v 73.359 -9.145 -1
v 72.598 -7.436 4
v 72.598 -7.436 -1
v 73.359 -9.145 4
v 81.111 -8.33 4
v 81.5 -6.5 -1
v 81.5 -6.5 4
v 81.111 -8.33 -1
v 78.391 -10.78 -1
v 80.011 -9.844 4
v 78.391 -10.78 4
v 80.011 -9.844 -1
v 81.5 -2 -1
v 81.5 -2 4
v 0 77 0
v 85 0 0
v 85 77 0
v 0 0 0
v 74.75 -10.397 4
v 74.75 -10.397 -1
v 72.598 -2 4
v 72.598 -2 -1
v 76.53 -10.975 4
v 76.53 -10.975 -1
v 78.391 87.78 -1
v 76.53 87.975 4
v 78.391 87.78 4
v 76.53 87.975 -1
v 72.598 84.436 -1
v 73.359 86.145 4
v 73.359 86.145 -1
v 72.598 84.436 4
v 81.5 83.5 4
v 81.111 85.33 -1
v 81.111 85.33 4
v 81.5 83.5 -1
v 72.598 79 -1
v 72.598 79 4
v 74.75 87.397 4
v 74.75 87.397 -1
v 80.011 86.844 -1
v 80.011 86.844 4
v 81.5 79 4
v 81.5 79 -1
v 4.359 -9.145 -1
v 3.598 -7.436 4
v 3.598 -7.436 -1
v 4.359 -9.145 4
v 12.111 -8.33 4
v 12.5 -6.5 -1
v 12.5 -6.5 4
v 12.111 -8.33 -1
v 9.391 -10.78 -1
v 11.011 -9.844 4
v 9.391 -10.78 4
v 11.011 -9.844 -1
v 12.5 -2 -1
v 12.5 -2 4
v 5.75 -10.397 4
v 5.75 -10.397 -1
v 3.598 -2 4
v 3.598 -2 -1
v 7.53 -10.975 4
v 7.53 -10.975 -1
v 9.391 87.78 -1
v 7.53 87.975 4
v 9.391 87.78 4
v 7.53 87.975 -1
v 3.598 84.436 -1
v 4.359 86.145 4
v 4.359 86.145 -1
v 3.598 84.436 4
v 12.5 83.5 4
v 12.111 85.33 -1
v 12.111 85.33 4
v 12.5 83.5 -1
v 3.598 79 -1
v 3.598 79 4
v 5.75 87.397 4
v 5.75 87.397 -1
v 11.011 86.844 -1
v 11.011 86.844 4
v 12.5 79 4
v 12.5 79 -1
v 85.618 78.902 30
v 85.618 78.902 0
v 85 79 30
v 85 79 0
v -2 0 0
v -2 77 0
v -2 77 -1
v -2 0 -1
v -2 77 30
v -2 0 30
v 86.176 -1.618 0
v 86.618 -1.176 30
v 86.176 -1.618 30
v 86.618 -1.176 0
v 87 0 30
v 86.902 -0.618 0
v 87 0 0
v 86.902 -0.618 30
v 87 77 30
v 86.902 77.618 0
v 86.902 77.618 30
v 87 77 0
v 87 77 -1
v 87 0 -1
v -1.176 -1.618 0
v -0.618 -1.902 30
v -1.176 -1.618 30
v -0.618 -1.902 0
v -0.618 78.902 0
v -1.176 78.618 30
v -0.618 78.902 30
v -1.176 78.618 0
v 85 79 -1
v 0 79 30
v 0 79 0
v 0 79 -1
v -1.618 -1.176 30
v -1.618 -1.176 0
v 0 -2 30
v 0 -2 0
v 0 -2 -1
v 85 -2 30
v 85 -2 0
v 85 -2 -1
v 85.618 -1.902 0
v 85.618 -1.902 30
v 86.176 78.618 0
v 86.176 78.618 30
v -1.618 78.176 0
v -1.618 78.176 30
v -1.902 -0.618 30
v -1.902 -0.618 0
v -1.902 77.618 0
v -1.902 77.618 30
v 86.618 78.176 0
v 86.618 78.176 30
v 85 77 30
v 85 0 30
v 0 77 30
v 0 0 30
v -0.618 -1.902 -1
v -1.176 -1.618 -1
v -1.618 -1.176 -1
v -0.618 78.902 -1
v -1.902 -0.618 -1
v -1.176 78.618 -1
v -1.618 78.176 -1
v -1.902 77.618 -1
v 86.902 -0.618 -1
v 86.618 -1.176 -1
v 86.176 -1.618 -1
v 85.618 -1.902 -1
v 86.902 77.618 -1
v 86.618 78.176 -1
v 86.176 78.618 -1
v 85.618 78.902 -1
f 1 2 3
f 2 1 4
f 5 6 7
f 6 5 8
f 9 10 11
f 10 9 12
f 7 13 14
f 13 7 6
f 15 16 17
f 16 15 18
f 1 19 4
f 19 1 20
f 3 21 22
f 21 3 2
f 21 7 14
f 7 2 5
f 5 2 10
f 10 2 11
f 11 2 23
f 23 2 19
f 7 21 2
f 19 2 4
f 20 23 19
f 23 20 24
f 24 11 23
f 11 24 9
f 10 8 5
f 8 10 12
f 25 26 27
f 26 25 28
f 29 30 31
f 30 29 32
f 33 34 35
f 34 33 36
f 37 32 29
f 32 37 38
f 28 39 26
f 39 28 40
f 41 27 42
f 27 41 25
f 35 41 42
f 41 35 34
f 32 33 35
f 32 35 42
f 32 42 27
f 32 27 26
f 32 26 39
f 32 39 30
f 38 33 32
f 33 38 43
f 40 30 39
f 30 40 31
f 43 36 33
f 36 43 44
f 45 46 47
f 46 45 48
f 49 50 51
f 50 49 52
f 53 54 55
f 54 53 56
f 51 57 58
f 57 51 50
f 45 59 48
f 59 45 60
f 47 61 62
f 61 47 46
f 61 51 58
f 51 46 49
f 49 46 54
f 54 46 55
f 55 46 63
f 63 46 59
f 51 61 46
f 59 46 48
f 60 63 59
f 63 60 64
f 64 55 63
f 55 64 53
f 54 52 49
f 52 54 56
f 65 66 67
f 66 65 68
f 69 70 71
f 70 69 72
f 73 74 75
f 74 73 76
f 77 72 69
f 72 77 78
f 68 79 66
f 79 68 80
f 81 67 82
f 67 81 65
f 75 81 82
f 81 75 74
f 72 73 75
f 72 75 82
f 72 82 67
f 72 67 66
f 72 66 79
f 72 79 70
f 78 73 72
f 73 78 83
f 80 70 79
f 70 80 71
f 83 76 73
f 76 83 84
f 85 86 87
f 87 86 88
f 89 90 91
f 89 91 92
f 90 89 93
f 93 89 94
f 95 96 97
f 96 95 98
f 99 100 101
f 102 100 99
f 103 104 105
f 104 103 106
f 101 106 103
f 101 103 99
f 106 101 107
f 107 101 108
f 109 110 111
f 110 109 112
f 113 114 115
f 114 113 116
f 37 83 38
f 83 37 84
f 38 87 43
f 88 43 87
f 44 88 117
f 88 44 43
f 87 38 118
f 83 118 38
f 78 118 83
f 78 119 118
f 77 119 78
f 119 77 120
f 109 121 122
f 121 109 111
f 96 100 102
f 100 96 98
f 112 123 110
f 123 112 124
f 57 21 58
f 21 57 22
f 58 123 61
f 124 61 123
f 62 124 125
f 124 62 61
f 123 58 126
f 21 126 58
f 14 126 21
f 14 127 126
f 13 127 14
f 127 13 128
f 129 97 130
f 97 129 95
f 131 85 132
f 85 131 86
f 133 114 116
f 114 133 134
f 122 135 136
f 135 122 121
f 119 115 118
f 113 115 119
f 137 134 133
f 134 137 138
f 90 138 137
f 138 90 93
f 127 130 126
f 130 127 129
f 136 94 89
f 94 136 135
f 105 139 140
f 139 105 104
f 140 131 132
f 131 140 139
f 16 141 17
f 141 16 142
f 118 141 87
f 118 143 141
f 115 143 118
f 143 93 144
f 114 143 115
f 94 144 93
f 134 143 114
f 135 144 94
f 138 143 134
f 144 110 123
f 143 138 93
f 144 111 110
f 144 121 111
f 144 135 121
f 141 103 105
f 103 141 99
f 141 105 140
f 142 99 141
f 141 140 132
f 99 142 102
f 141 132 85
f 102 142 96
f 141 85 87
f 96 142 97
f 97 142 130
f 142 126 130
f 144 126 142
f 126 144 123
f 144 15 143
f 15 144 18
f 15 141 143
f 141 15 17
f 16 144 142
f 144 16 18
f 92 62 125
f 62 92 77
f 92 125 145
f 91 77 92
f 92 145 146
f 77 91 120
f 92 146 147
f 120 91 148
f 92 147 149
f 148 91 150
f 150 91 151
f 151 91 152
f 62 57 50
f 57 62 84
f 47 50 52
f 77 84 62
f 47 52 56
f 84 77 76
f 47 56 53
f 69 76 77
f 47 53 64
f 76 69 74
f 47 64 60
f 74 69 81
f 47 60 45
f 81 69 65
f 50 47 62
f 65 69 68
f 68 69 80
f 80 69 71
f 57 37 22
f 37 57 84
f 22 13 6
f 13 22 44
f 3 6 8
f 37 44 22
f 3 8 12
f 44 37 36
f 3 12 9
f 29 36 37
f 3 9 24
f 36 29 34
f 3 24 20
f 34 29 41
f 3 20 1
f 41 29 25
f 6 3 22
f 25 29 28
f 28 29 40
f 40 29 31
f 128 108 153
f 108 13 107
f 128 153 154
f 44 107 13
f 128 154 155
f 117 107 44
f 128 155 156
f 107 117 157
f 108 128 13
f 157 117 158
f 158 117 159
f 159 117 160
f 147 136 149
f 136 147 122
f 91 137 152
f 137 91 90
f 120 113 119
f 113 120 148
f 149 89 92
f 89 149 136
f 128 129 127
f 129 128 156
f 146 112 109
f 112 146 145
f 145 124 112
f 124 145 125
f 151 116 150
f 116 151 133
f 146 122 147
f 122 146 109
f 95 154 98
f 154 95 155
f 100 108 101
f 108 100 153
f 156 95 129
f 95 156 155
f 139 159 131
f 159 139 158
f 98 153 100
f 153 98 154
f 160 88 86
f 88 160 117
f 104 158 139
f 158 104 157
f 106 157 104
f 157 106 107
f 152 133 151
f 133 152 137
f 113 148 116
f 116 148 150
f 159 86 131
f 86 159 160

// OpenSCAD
// 69x90

mid_x = 85/2;

module ear() {
    ofs_y = -6.5;
    hull() {
        translate([0, ofs_y, 0])
        cylinder(d=9, h=4);
        translate([0, 5, 0])
        cylinder(d=9, h=4);
        
    }
    hull() {
        translate([0, 90 + ofs_y, 0])
        cylinder(d=9, h=4);
        translate([0, 90 - 20, 0])
        cylinder(d=9, h=4);
    }
}

module ears() {
    translate([mid_x + 69/2,0,0])
    ear();
    translate([mid_x - 69/2,0,0])
    ear();
}

y_length = 77;

module wall(e = 1) {
    difference() {
        union() {
            minkowski() {
                cylinder(r = 2, h = 1,$fn=20);
                cube([85, y_length, 30]);
            }
            if(e == 1) ears();
        }
        
        cube([85, y_length, 30]);
        
        translate([-10,-10,30])
        cube([100,100,100]);
        
        translate([-10,-10,30])
        cube([100,100,100]);
        
        translate([0,0,-100])
        cube([100,100,100]);
    }
}

btm_hgt = 1;

module bottom() {
    translate([0,0,-btm_hgt])
    linear_extrude(height=btm_hgt)
    hull()
    projection()
    wall(0);
}

wall();
bottom();

//fixup ears
translate([0,0,-btm_hgt])
difference() {
    ears();
    cube([85, y_length, 30]);
}
